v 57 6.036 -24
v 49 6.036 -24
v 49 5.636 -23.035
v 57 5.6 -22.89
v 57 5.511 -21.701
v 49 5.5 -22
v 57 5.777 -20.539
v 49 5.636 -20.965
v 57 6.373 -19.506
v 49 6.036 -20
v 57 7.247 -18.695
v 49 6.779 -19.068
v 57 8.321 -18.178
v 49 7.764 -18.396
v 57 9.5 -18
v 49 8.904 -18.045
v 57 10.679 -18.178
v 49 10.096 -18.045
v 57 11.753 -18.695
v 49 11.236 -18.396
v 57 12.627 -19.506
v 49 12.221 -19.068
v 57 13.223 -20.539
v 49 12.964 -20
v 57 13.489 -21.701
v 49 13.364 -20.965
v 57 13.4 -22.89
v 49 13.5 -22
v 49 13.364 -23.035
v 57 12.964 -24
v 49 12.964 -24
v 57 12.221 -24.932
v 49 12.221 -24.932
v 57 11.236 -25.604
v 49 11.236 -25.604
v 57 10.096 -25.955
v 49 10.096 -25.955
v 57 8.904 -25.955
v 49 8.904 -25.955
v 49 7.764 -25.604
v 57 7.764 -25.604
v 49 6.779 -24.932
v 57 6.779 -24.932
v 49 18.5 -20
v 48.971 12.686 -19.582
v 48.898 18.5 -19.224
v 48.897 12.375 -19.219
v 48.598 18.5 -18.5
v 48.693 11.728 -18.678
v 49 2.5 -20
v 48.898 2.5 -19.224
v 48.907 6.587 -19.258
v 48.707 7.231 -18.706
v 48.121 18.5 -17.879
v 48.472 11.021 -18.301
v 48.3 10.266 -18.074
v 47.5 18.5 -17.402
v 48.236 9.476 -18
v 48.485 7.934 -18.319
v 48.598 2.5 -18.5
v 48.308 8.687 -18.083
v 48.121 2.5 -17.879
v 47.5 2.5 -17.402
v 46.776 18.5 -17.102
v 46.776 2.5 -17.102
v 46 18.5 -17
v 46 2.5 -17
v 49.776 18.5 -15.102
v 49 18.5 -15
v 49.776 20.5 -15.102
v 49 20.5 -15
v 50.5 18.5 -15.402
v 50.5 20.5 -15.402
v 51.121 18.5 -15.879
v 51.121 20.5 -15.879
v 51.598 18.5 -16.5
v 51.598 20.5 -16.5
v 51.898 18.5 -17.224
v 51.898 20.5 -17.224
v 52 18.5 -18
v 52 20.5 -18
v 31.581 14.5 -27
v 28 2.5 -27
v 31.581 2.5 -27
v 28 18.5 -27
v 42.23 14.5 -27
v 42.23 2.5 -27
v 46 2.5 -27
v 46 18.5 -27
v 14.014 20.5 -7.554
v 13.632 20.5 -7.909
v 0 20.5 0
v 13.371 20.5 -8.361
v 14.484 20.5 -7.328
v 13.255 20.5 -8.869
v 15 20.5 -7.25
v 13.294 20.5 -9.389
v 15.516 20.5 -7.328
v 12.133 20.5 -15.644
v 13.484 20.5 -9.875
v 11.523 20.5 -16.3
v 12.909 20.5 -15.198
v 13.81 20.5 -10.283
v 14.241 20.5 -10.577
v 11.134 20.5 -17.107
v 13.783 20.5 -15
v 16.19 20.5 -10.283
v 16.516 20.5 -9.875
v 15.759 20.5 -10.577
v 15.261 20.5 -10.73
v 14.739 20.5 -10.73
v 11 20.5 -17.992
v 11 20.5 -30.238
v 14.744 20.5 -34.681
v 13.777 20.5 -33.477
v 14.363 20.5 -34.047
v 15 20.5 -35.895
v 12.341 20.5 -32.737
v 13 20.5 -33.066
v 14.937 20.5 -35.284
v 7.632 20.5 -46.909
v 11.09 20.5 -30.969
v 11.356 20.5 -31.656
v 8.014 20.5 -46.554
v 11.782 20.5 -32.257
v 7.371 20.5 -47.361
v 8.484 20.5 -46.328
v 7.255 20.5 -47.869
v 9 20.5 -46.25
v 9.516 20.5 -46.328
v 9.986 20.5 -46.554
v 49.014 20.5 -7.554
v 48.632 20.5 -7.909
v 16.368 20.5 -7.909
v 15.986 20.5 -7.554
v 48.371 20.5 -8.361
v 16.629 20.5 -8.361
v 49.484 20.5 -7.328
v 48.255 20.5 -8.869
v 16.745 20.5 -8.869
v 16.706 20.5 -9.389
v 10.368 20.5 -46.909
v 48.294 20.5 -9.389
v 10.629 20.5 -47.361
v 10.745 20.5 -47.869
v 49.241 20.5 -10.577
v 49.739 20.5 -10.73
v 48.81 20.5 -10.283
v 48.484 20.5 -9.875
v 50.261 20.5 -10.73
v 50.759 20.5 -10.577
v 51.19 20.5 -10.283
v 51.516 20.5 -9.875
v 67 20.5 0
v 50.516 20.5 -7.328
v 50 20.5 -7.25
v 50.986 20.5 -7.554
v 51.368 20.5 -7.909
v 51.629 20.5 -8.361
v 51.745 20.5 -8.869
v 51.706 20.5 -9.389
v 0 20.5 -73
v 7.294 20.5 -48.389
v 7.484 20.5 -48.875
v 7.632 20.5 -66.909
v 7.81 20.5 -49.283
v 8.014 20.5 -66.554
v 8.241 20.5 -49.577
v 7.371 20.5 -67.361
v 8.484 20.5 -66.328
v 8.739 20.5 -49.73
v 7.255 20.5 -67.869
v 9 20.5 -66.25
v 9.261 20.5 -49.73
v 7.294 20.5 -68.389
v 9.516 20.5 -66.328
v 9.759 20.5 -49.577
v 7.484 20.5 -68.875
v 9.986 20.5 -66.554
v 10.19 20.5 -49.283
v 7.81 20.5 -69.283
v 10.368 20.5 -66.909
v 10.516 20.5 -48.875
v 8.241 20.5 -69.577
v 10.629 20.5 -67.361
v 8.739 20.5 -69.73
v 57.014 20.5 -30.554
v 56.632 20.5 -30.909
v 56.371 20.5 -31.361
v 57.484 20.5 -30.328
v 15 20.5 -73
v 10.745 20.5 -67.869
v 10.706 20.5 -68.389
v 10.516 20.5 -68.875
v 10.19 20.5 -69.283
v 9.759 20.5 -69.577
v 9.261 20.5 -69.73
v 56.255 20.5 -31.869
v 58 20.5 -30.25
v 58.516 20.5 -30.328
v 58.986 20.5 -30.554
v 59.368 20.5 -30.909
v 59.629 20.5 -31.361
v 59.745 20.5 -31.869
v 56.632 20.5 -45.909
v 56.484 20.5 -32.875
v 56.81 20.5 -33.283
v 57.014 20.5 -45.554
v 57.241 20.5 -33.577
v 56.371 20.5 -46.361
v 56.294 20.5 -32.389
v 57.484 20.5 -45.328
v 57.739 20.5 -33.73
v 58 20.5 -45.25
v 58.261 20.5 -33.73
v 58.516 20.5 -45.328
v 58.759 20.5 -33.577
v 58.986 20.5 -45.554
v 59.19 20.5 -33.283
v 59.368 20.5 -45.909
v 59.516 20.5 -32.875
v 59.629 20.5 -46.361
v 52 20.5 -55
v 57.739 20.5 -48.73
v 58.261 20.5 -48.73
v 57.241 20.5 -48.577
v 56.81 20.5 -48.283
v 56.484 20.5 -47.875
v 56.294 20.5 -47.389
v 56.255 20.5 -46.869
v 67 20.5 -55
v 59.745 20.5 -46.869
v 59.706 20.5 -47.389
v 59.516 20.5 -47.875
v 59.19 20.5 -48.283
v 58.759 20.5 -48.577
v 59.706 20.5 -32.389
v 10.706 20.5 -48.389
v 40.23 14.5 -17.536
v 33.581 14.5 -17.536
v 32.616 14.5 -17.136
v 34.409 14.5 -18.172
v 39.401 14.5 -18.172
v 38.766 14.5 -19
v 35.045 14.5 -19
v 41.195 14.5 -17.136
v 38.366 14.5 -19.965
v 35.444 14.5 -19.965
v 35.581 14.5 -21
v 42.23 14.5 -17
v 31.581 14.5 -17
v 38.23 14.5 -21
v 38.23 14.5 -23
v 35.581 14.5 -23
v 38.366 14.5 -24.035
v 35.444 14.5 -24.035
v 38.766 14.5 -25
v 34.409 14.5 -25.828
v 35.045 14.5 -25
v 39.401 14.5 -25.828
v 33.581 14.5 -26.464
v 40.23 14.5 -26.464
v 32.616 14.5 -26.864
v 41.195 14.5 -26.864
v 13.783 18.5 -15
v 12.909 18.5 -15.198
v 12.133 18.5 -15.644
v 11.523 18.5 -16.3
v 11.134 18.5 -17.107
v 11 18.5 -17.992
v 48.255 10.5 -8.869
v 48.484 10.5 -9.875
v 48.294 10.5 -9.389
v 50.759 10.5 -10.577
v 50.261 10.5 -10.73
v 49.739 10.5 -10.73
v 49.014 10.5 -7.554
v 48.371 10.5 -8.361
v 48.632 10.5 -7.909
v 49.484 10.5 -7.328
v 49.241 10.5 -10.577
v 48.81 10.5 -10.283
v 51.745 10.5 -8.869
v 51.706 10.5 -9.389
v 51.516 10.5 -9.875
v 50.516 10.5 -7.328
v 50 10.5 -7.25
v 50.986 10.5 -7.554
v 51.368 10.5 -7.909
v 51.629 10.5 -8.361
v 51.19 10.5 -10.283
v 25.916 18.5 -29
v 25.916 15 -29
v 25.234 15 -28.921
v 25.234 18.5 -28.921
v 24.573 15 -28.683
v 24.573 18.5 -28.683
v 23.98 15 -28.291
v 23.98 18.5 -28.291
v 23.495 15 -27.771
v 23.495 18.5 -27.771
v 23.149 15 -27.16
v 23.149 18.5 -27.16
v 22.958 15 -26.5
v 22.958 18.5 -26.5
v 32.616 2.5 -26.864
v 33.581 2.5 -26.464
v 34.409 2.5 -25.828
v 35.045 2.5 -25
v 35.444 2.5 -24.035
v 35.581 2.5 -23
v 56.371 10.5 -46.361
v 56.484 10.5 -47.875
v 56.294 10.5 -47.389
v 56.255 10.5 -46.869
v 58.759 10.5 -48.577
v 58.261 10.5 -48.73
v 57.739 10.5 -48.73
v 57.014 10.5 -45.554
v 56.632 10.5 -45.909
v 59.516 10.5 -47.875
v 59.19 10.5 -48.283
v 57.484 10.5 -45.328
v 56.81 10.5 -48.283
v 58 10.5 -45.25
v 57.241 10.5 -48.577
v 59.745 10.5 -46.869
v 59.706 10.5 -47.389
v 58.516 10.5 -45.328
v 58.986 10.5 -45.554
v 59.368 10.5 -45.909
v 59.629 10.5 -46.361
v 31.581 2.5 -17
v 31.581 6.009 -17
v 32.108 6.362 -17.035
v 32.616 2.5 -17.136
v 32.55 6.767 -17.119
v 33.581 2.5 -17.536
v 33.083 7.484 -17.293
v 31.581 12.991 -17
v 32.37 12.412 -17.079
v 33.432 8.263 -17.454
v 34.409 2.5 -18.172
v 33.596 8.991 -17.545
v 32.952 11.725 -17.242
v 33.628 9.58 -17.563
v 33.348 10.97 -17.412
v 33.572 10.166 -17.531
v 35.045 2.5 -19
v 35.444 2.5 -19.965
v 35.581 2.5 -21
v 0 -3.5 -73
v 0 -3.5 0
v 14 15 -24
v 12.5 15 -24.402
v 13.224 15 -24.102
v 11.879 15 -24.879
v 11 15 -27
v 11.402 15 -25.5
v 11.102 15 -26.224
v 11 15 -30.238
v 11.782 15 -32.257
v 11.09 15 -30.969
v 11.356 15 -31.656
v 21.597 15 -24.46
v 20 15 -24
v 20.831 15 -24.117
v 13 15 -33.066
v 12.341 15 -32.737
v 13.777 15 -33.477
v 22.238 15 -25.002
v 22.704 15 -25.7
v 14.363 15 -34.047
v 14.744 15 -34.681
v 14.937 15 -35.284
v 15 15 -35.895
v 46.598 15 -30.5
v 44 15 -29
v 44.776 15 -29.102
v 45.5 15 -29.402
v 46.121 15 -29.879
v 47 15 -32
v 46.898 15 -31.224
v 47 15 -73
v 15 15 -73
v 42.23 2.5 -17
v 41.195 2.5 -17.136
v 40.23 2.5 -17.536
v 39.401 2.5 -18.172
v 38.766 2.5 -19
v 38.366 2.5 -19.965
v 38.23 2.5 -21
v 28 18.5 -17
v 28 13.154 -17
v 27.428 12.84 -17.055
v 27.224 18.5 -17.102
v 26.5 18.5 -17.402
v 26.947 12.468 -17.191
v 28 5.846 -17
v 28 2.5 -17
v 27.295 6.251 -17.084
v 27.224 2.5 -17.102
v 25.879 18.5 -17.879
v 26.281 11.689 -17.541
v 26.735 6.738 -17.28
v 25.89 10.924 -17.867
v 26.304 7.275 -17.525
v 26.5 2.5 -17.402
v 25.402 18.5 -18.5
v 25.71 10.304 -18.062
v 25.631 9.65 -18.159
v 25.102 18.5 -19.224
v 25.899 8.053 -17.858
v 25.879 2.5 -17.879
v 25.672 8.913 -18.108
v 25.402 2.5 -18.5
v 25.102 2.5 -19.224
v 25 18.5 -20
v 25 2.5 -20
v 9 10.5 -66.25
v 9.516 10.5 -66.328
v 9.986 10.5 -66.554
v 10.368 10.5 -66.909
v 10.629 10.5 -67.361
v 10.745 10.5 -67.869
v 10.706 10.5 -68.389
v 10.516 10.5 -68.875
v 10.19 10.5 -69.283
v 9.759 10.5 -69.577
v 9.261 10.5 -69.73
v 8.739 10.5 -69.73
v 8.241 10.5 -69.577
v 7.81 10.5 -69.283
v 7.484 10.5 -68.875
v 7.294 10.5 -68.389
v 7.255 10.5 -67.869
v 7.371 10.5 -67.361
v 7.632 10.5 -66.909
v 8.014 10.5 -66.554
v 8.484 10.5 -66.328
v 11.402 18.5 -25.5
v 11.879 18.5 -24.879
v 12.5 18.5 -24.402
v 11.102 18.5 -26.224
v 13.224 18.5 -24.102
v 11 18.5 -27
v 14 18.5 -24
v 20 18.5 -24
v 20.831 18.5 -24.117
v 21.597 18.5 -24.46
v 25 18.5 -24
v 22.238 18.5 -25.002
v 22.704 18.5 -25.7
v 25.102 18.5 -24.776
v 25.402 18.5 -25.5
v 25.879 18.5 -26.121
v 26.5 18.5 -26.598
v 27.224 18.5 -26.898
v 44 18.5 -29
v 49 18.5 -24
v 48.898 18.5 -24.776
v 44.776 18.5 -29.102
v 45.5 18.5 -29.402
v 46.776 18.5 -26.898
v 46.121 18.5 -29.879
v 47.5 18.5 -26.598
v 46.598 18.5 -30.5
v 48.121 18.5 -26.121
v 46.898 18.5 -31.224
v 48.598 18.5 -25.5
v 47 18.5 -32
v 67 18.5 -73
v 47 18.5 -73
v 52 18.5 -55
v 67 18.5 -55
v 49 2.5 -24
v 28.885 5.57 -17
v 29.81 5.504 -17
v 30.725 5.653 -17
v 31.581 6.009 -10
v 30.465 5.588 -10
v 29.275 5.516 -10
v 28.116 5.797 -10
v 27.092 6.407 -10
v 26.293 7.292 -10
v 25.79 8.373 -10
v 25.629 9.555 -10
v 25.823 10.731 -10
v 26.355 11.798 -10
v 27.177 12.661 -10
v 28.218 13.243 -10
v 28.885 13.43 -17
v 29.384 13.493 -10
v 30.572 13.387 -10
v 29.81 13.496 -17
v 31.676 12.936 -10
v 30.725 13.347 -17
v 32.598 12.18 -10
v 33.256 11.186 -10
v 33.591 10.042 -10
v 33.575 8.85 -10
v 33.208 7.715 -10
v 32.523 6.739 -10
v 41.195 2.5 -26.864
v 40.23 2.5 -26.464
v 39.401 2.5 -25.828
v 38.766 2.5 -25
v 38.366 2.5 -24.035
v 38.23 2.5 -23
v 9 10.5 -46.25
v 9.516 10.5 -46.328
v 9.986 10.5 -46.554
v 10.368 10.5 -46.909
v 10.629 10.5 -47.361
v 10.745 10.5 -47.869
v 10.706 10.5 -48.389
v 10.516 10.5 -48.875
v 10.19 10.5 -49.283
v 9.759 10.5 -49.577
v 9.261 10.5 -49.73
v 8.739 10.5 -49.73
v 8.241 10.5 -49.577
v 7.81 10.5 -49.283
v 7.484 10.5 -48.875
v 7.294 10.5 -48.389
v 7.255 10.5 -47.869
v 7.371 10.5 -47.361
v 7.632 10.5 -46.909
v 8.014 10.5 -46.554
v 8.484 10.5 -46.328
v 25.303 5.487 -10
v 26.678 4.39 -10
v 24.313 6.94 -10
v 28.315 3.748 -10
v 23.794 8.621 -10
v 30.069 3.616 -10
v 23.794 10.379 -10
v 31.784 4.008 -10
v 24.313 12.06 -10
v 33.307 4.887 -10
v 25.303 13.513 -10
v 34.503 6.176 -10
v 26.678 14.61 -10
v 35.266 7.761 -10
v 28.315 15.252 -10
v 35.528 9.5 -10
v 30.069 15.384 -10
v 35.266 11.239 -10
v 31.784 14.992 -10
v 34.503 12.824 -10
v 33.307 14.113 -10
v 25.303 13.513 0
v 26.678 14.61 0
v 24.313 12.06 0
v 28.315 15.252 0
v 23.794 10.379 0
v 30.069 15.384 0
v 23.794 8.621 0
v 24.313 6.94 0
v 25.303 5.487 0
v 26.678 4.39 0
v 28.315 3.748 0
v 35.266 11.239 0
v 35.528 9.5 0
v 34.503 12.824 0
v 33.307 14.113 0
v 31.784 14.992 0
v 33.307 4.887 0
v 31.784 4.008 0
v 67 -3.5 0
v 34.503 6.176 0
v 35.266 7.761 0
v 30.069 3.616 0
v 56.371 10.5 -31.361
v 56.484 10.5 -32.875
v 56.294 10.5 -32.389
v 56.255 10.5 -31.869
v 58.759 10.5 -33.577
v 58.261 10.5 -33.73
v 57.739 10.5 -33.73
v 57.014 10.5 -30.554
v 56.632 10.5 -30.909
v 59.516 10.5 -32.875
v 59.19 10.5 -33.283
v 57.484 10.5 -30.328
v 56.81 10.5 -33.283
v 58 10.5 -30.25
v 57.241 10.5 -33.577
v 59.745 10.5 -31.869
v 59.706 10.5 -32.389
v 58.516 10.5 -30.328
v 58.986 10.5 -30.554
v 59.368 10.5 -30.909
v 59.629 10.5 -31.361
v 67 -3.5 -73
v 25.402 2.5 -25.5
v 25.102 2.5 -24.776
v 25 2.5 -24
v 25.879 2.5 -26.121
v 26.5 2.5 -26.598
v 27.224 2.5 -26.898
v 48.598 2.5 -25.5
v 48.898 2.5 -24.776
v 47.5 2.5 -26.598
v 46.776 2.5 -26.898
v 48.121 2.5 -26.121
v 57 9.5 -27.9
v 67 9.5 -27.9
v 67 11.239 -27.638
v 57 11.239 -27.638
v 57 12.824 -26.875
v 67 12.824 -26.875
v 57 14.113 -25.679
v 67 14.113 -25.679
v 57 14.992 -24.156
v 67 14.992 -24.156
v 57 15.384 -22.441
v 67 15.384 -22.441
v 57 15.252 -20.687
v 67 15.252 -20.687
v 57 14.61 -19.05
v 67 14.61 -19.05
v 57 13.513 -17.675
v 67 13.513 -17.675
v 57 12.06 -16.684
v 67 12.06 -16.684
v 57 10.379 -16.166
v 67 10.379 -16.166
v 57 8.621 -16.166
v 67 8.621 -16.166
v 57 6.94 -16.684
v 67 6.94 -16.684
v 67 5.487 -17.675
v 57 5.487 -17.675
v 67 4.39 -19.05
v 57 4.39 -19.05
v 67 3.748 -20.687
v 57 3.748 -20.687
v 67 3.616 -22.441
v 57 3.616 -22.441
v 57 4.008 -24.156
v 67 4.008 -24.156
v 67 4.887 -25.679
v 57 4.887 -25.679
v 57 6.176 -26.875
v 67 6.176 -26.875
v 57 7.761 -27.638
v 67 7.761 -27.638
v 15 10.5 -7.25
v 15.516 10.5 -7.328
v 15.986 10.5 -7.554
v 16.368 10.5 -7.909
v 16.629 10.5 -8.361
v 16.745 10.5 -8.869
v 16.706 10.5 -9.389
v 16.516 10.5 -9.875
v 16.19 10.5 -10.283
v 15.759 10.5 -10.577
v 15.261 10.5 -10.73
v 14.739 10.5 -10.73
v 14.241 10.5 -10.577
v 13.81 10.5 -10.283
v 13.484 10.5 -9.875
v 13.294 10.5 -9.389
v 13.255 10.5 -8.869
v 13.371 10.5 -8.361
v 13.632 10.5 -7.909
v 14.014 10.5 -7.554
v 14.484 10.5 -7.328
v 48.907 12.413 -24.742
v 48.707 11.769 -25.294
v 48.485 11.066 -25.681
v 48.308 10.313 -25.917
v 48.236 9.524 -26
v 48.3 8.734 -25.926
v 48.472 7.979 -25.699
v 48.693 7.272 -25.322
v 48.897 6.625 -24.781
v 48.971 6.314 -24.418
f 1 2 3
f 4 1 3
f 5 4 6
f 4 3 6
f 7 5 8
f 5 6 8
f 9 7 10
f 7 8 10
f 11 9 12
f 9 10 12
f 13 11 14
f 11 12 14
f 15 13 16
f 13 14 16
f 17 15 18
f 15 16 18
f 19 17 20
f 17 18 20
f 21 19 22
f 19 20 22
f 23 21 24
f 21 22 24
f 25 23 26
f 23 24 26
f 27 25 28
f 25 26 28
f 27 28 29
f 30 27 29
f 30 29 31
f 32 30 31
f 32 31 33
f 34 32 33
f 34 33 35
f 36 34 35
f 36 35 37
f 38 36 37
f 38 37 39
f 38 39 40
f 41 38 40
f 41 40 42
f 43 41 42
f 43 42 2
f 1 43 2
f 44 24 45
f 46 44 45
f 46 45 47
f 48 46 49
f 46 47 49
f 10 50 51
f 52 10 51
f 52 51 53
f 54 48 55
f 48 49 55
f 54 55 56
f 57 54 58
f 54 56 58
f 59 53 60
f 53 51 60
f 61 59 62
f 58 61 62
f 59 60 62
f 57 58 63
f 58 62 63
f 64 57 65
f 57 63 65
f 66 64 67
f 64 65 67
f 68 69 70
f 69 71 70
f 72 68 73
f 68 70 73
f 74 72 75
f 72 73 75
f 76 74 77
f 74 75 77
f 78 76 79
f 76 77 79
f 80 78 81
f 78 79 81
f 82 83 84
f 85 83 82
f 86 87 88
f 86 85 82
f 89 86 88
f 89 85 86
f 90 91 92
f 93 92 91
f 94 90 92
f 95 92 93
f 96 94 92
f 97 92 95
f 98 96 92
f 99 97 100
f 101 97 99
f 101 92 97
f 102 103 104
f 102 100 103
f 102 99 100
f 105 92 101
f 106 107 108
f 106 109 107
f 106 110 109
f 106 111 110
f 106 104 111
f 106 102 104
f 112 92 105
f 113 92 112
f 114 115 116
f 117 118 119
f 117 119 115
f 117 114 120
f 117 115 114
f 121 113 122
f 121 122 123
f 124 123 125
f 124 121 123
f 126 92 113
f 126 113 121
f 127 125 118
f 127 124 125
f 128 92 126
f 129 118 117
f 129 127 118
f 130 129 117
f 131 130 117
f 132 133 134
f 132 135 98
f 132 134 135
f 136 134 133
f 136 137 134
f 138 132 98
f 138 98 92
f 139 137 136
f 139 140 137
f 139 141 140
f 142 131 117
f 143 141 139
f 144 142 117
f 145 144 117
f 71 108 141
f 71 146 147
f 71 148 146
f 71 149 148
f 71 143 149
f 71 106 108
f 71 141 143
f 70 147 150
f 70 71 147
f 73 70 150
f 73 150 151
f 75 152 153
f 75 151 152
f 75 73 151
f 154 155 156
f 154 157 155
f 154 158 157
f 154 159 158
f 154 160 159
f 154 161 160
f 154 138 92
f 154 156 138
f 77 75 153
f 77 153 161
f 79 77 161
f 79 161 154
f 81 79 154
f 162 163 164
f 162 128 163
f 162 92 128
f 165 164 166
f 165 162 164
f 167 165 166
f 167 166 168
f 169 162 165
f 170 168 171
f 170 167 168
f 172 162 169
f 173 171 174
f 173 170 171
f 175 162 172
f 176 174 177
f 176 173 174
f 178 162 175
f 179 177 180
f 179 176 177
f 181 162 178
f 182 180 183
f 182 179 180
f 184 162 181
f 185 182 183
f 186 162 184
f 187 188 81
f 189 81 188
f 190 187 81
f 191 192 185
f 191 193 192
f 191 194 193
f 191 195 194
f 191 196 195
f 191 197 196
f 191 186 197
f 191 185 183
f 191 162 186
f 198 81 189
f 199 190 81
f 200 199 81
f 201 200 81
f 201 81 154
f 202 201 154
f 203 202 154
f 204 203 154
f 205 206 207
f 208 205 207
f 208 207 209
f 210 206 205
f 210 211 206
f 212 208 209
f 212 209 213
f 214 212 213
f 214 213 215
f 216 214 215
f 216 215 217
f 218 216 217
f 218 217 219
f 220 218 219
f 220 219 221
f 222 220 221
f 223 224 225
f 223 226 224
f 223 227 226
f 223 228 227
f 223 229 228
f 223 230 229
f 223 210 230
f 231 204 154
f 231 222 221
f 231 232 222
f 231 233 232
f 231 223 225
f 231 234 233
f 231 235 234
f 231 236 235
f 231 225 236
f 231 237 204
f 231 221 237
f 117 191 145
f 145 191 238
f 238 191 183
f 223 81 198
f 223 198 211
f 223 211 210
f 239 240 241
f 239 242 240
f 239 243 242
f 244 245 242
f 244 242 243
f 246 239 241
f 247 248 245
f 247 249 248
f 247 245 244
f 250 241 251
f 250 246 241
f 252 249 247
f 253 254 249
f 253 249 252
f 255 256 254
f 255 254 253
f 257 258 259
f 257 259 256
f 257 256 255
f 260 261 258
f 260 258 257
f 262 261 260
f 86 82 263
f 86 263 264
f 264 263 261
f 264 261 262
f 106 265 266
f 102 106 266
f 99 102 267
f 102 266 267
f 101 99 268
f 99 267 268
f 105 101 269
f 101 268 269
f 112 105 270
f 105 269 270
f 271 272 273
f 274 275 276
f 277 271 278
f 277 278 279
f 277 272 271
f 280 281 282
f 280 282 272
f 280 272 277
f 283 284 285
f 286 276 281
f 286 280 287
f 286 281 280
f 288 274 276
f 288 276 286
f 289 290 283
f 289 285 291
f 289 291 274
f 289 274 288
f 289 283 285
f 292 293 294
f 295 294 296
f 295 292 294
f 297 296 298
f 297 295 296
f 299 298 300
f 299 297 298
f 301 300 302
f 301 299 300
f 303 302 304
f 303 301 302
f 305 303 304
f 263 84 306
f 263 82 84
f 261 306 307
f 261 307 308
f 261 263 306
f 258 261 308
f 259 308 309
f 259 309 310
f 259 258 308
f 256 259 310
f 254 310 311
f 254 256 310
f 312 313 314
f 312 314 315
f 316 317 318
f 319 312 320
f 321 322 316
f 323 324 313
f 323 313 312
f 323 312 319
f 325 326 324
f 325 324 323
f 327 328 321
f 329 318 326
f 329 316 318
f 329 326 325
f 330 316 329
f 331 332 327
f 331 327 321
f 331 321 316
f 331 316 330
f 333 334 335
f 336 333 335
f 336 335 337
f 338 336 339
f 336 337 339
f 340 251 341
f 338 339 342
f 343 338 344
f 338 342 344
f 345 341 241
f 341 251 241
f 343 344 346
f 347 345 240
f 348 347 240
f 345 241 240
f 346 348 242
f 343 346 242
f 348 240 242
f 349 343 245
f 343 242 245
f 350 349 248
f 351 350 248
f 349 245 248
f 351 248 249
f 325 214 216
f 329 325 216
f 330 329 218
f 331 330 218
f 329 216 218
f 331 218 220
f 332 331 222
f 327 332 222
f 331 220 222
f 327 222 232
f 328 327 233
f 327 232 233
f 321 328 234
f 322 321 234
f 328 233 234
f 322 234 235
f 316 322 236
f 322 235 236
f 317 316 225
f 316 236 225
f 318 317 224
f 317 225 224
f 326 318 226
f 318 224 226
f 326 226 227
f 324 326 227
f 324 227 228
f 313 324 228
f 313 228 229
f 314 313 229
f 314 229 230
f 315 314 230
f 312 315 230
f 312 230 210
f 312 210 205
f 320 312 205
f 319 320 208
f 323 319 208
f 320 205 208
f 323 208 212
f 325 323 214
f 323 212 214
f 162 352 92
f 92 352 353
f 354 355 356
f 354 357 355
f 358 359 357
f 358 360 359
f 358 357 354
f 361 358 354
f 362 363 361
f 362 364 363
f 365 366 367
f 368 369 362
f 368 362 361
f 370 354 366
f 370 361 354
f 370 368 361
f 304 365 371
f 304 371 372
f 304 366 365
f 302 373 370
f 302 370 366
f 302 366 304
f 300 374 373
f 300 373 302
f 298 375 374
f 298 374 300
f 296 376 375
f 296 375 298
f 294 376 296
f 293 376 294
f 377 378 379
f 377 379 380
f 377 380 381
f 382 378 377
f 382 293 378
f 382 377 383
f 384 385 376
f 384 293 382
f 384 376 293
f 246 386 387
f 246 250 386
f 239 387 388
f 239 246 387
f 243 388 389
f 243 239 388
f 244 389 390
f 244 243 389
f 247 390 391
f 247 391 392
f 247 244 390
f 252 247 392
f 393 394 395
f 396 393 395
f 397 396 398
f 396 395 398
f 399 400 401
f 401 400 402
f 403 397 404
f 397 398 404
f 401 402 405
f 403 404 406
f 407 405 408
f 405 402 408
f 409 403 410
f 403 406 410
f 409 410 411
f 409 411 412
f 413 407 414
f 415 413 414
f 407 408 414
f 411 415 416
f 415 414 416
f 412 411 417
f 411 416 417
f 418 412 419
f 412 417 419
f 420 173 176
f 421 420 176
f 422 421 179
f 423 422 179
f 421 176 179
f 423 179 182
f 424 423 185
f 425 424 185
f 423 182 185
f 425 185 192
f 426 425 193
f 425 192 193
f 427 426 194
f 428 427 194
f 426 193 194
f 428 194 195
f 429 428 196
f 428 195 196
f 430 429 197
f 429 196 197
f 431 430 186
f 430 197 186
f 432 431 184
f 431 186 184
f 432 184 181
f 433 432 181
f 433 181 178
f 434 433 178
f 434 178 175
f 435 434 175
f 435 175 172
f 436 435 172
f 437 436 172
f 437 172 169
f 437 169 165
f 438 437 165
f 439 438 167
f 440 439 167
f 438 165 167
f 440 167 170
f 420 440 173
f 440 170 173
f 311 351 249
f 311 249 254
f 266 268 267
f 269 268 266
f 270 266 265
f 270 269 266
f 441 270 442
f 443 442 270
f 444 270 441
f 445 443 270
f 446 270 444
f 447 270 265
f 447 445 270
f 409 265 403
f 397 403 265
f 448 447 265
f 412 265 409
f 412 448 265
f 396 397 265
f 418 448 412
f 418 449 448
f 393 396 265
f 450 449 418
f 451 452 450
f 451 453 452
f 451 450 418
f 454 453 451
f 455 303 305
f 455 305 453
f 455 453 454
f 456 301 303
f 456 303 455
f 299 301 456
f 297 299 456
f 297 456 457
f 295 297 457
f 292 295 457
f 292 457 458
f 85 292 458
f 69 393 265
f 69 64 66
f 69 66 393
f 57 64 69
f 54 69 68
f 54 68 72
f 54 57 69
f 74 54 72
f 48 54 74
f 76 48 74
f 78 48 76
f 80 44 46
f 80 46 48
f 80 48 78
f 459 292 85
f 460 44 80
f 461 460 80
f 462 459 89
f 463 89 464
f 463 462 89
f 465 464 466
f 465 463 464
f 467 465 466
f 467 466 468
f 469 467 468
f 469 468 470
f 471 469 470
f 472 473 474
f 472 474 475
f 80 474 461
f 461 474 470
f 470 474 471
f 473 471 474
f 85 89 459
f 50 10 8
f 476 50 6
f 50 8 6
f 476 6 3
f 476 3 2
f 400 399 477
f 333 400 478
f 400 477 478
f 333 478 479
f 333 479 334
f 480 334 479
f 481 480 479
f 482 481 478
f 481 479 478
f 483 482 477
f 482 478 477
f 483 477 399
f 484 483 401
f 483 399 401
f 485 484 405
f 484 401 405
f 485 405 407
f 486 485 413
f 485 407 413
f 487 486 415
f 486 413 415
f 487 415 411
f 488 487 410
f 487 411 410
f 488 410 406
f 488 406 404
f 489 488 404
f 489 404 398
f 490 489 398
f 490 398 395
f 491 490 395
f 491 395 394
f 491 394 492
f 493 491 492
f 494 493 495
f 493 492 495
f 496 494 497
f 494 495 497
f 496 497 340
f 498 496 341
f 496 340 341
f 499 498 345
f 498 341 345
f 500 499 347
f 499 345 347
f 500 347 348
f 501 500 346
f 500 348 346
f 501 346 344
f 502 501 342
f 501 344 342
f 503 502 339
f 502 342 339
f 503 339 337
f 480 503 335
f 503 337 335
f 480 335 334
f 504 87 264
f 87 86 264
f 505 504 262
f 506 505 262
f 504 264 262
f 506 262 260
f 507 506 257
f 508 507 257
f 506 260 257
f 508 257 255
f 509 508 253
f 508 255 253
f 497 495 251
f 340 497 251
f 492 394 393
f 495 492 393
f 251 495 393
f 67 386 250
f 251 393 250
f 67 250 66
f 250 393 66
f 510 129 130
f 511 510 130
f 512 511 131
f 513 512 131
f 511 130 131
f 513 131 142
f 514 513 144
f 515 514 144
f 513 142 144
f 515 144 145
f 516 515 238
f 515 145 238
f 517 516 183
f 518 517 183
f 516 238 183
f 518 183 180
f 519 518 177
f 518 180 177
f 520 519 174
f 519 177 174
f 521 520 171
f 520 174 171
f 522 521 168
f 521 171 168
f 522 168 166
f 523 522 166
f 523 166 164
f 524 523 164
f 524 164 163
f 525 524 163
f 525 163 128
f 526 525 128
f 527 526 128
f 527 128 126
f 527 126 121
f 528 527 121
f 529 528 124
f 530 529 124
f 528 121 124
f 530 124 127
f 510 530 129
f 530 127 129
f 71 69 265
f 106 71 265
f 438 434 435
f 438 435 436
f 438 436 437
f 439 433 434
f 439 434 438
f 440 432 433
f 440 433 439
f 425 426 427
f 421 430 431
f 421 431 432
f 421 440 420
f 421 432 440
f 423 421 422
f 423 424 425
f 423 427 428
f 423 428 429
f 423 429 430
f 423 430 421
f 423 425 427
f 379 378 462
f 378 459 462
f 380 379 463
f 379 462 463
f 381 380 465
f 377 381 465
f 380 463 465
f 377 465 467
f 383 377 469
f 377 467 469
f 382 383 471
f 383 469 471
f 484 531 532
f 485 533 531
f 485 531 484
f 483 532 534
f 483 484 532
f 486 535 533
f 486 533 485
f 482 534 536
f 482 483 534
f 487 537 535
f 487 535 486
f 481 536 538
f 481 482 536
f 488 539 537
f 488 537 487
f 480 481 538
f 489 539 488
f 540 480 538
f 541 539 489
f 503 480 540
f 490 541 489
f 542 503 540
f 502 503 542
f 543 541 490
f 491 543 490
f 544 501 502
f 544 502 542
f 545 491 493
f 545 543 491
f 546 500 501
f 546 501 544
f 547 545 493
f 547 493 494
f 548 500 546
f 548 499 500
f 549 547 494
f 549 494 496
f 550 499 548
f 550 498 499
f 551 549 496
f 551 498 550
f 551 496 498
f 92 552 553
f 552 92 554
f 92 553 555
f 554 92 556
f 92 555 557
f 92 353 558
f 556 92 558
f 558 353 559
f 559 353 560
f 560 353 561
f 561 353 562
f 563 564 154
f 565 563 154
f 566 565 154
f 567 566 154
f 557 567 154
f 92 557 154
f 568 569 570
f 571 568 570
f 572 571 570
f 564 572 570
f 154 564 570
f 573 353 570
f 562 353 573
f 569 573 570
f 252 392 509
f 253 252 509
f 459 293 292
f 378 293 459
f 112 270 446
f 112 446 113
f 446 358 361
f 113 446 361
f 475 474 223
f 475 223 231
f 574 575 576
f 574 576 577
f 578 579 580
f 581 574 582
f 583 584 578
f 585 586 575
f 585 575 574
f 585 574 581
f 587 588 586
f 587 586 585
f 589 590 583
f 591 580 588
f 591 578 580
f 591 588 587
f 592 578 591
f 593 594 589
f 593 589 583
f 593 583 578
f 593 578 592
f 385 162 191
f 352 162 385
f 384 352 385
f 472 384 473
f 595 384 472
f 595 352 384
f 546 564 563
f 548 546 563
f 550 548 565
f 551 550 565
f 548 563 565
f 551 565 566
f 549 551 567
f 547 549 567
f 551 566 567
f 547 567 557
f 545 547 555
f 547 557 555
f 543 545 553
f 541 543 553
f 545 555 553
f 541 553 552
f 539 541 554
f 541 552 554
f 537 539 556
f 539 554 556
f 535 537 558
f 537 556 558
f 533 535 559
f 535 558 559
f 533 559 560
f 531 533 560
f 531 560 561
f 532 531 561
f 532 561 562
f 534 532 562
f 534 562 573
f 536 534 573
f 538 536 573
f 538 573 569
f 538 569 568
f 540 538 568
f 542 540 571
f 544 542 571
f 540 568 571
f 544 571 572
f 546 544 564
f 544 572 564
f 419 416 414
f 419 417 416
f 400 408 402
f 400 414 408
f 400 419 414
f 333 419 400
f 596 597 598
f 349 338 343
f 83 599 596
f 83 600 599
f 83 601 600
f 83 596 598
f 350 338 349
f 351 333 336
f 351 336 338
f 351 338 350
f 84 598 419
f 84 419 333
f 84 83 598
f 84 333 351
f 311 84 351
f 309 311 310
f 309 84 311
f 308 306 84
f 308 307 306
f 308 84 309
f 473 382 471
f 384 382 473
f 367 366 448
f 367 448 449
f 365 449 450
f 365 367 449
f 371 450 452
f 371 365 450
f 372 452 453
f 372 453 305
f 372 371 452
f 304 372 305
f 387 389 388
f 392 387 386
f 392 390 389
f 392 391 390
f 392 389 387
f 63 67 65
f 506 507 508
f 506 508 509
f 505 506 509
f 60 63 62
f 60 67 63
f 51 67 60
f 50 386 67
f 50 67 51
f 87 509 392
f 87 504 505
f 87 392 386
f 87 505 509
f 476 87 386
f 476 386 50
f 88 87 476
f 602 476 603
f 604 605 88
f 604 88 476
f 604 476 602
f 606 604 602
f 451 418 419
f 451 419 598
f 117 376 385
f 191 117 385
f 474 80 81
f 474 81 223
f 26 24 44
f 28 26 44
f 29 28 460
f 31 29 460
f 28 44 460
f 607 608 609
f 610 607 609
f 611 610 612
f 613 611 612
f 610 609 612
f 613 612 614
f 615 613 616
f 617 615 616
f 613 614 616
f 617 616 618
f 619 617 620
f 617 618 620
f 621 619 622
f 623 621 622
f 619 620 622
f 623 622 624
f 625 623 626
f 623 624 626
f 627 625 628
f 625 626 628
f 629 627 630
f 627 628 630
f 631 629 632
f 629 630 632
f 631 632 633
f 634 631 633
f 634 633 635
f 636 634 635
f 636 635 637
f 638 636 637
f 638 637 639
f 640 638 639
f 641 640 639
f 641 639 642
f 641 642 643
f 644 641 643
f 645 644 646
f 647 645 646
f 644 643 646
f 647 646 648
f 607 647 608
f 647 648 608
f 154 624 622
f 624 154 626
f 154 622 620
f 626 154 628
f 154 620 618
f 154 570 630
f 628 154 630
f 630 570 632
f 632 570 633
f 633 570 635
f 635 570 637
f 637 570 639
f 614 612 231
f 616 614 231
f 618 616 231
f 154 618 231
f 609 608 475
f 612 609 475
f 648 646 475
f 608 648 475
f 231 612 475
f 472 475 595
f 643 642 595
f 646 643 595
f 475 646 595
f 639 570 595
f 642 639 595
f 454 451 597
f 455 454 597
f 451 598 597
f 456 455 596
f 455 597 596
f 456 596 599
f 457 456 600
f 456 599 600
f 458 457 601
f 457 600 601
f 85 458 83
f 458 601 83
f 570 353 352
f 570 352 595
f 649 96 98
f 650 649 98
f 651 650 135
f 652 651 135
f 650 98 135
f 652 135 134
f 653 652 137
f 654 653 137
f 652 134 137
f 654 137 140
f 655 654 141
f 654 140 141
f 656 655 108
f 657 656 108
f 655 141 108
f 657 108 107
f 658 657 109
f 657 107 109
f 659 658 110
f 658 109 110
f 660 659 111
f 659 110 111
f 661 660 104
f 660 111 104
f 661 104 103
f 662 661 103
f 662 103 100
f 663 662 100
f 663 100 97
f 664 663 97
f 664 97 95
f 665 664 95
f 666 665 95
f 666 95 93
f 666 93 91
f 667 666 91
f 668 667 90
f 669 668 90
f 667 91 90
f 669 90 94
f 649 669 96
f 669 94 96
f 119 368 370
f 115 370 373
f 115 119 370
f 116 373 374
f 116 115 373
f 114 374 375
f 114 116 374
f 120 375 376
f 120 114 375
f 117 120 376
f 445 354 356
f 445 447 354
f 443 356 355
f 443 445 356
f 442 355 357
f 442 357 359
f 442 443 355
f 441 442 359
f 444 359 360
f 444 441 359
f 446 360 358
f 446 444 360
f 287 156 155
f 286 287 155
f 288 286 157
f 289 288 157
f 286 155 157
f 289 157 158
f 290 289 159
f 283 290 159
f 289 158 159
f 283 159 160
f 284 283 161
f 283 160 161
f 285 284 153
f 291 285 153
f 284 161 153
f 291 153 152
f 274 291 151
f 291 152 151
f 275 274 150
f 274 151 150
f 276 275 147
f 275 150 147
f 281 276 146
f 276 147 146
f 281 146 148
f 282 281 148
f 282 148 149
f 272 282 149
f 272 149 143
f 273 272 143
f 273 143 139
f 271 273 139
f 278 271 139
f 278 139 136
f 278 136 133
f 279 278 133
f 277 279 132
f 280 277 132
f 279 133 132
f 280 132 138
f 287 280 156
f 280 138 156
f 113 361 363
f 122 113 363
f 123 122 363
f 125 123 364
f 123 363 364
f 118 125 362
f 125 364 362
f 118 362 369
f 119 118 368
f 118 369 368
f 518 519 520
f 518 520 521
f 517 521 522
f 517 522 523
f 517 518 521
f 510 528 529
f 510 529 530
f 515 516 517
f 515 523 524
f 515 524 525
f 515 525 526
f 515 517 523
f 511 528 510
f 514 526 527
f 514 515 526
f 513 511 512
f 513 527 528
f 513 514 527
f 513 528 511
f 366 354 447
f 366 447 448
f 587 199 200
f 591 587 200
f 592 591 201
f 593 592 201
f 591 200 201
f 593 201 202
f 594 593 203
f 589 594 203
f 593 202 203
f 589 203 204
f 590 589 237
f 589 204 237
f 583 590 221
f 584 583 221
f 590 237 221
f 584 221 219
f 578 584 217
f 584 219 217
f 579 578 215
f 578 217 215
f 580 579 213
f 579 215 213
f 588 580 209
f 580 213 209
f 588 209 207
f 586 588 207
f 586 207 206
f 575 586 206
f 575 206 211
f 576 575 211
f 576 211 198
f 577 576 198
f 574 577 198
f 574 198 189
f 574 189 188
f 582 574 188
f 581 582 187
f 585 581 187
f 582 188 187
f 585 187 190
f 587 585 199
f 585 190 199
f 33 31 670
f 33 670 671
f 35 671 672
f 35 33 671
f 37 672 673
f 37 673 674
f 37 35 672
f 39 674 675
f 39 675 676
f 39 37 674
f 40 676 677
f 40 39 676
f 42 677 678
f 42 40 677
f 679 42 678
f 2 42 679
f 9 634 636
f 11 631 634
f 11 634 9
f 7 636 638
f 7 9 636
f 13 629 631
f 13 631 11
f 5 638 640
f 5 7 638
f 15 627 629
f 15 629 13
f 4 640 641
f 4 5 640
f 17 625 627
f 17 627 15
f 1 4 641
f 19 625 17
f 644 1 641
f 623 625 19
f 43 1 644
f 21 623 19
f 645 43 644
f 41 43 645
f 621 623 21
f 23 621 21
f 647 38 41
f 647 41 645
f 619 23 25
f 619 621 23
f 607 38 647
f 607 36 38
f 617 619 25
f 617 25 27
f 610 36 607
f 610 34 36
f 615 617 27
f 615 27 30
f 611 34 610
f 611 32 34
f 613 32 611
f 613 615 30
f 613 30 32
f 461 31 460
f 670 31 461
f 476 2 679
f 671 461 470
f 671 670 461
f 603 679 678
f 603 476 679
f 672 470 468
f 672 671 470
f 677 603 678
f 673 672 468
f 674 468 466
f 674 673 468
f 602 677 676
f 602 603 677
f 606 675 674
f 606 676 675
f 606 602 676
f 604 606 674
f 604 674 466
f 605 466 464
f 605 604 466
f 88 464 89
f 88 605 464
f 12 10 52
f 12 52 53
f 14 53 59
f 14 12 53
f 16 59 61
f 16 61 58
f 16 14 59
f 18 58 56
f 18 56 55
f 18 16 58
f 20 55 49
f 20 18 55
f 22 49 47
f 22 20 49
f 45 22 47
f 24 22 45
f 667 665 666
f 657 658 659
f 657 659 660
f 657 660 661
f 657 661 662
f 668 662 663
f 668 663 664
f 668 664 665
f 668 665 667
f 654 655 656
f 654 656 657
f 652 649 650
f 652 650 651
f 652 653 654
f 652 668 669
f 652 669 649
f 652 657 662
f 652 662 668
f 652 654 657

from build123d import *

# Parameters (mm, degrees)
SKETCH1_W                = 67
SKETCH1_H                = 73
BOSS_EXTRUDE1_DEPTH      = 15
BOSS_EXTRUDE2_DEPTH      = 3.5
SKETCH6_W                = 24
SKETCH6_H                = 10
CUT_EXTRUDE2_DEPTH       = 16
SKETCH11_W               = 67
SKETCH11_H               = 73
BOSS_EXTRUDE4_DEPTH      = 3.5
SKETCH13_W               = 15
SKETCH13_H               = 40
BOSS_EXTRUDE6_DEPTH      = 5.5
SKETCH14_R               = 1.75
CUT_EXTRUDE7_DEPTH       = 10
BOSS_EXTRUDE7_DEPTH      = 5.5
FILLET5_R                = 3
SKETCH20_W               = 15
SKETCH20_H               = 18
BOSS_EXTRUDE8_DEPTH      = 3.5
FILLET10_R               = 3
FILLET11_R               = 3
FILLET12_R               = 3
FILLET13_R               = 3
SKETCH21_W               = 2.649172372
SKETCH21_H               = 10
BOSS_EXTRUDE9_DEPTH      = 12
FILLET15_R               = 4
SKETCH19_R               = 1.75
CUT_EXTRUDE11_DEPTH      = 10
SKETCH23_R               = 4
CUT_EXTRUDE12_DEPTH      = 2
CUT_EXTRUDE12_DEPTH_BACK = 91.278735196
SKETCH24_R               = 5.9
CUT_EXTRUDE13_DEPTH      = 10
SKETCH25_R               = 4
CUT_EXTRUDE14_DEPTH      = 2
CUT_EXTRUDE14_DEPTH_BACK = 90.695317764
SKETCH26_R               = 5.9
CUT_EXTRUDE15_DEPTH      = 10


with BuildPart() as part:
    # Sketch1 → Boss-Extrude1 (new body)
    with BuildSketch(Plane(origin=(0, 0, 0), x_dir=(1, 0, 0), z_dir=(0, 1, 0))):
        with Locations((33.5, 36.5)):
            Rectangle(SKETCH1_W, SKETCH1_H)
    extrude(amount=BOSS_EXTRUDE1_DEPTH)

    # Sketch5 → Boss-Extrude2 (add)
    with BuildSketch(Plane(origin=(0, 15, 0), x_dir=(1, 0, 0), z_dir=(0, 1, 0))):
        with BuildLine():
            Line((18.5, 15), (11, 15))
            Line((11, 15), (11, 24))
            Line((11, 24), (14.788897449, 24))
            Line((14.788897449, 24), (20, 24))
            ThreePointArc((20, 24), (22.121320344, 24.878679656), (23, 27))
            Line((23, 27), (23, 29))
            Line((23, 29), (47, 29))
            Line((47, 29), (47, 73))
            Line((47, 73), (52, 73))
            Line((52, 73), (52, 15))
            Line((52, 15), (32, 15))
            Line((32, 15), (18.5, 15))
        make_face()
    extrude(amount=BOSS_EXTRUDE2_DEPTH)

    # Sketch6 → Cut-Extrude2 (cut)
    with BuildSketch(Plane(origin=(0, 18.5, 0), x_dir=(1, 0, 0), z_dir=(0, 1, 0))):
        with Locations((37, 22)):
            Rectangle(SKETCH6_W, SKETCH6_H)
    extrude(amount=-CUT_EXTRUDE2_DEPTH, mode=Mode.SUBTRACT)

    # Sketch11 → Boss-Extrude4 (add)
    with BuildSketch(Plane.XZ):
        with Locations((33.5, -36.5)):
            Rectangle(SKETCH11_W, SKETCH11_H)
    extrude(amount=BOSS_EXTRUDE4_DEPTH)

    # Sketch13 → Boss-Extrude6 (add)
    with BuildSketch(Plane(origin=(0, 15, 0), x_dir=(1, 0, 0), z_dir=(0, 1, 0))):
        with Locations((59.5, 35)):
            Rectangle(SKETCH13_W, SKETCH13_H)
    extrude(amount=BOSS_EXTRUDE6_DEPTH)

    # Sketch14 → Cut-Extrude7 (cut)
    with BuildSketch(Plane(origin=(0, 20.5, 0), x_dir=(1, 0, 0), z_dir=(0, 1, 0))):
        with Locations(Location((58, 47, 0), (0, 0, 270))):
            Circle(SKETCH14_R)
        with Locations(Location((58, 32, 0), (0, 0, 270))):
            Circle(SKETCH14_R)
    extrude(amount=-CUT_EXTRUDE7_DEPTH, mode=Mode.SUBTRACT)

    # Sketch18 → Boss-Extrude7 (add)
    with BuildSketch(Plane(origin=(0, 15, 0), x_dir=(1, 0, 0), z_dir=(0, 1, 0))):
        with BuildLine():
            Line((15, 33.237791503), (15, 73))
            Line((15, 73), (0, 73))
            Line((0, 73), (0, 15))
            Line((0, 15), (0, 0))
            Line((0, 0), (67, 0))
            Line((67, 0), (67, 15))
            Line((67, 15), (15, 15))
            Line((15, 15), (13.782507359, 15))
            ThreePointArc((13.782507359, 15), (11.803129735, 15.9491273), (11, 17.992105772))
            Line((11, 17.992105772), (11, 30.237791503))
            ThreePointArc((11, 30.237791503), (11.878679656, 32.359111846), (14, 33.237791503))
            Line((14, 33.237791503), (15, 33.237791503))
        make_face()
    extrude(amount=BOSS_EXTRUDE7_DEPTH)

    # Fillet5
    fillet5_edges = [part.edges().sort_by_distance(p)[0] for p in [
        (52, 19.5, -15),
    ]]
    fillet(fillet5_edges, radius=FILLET5_R)

    # Sketch20 → Boss-Extrude8 (add)
    with BuildSketch(Plane(origin=(0, 15, 0), x_dir=(1, 0, 0), z_dir=(0, 1, 0))):
        with Locations((59.5, 64)):
            Rectangle(SKETCH20_W, SKETCH20_H)
    extrude(amount=BOSS_EXTRUDE8_DEPTH)

    # Fillet10
    fillet10_edges = [part.edges().sort_by_distance(p)[0] for p in [
        (47, 16.75, -29),
    ]]
    fillet(fillet10_edges, radius=FILLET10_R)

    # Fillet11
    fillet11_edges = [part.edges().sort_by_distance(p)[0] for p in [
        (23, 16.75, -29),
        (11, 16.75, -24),
    ]]
    fillet(fillet11_edges, radius=FILLET11_R)

    # Fillet12
    fillet12_edges = [part.edges().sort_by_distance(p)[0] for p in [
        (15, 17.75, -33.237791503),
    ]]
    fillet(fillet12_edges, radius=FILLET12_R)

    # Fillet13
    fillet13_edges = [part.edges().sort_by_distance(p)[0] for p in [
        (25, 10.5, -17),
        (25, 10.5, -27),
        (49, 10.5, -27),
        (49, 10.5, -17),
    ]]
    fillet(fillet13_edges, radius=FILLET13_R)

    # Sketch21 → Boss-Extrude9 (add)
    with BuildSketch(Plane(origin=(0, 2.5, 0), x_dir=(1, 0, 0), z_dir=(0, 1, 0))):
        with Locations((36.905299385, 22)):
            Rectangle(SKETCH21_W, SKETCH21_H)
    extrude(amount=BOSS_EXTRUDE9_DEPTH)

    # Fillet15
    fillet15_edges = [part.edges().sort_by_distance(p)[0] for p in [
        (35.580713199, 8.5, -27),
        (35.580713199, 8.5, -17),
        (38.229885571, 8.5, -17),
        (38.229885571, 8.5, -27),
    ]]
    fillet(fillet15_edges, radius=FILLET15_R)

    # Sketch19 → Cut-Extrude11 (cut)
    with BuildSketch(Plane(origin=(0, 20.5, 0), x_dir=(1, 0, 0), z_dir=(0, 1, 0))):
        with Locations(Location((9, 48, 0), (0, 0, 270))):
            Circle(SKETCH19_R)
        with Locations(Location((9, 68, 0), (0, 0, 270))):
            Circle(SKETCH19_R)
        with Locations(Location((15, 9, 0), (0, 0, 270))):
            Circle(SKETCH19_R)
        with Locations(Location((50, 9, 0), (0, 0, 270))):
            Circle(SKETCH19_R)
    extrude(amount=-CUT_EXTRUDE11_DEPTH, mode=Mode.SUBTRACT)

    # Sketch23 → Cut-Extrude12 (cut, two sides)
    with BuildSketch(Plane.ZY.offset(-49)) as cut_extrude12_sk:
        with Locations(Location((-22, 9.5, 0), (0, 0, 240))):
            Circle(SKETCH23_R)
    extrude(amount=CUT_EXTRUDE12_DEPTH, mode=Mode.SUBTRACT)
    extrude(cut_extrude12_sk.sketch, amount=-CUT_EXTRUDE12_DEPTH_BACK, mode=Mode.SUBTRACT)

    # Sketch24 → Cut-Extrude13 (cut)
    with BuildSketch(Plane(origin=(67, 0, 0), x_dir=(0, 0, -1), z_dir=(1, 0, 0))):
        with Locations((22, 9.5)):
            Circle(SKETCH24_R)
    extrude(amount=-CUT_EXTRUDE13_DEPTH, mode=Mode.SUBTRACT)

    # Sketch25 → Cut-Extrude14 (cut, two sides)
    with BuildSketch(Plane(origin=(0, 0, -17), x_dir=(-1, 0, 0), z_dir=(0, 0, -1))) as cut_extrude14_sk:
        with Locations(Location((-29.628343357, 9.5, 0), (0, 0, 240.784718546))):
            Circle(SKETCH25_R)
    extrude(amount=CUT_EXTRUDE14_DEPTH, mode=Mode.SUBTRACT)
    extrude(cut_extrude14_sk.sketch, amount=-CUT_EXTRUDE14_DEPTH_BACK, mode=Mode.SUBTRACT)

    # Sketch26 → Cut-Extrude15 (cut)
    with BuildSketch(Plane.XY):
        with Locations((29.628343357, 9.5)):
            Circle(SKETCH26_R)
    extrude(amount=-CUT_EXTRUDE15_DEPTH, mode=Mode.SUBTRACT)


solid = part.part
